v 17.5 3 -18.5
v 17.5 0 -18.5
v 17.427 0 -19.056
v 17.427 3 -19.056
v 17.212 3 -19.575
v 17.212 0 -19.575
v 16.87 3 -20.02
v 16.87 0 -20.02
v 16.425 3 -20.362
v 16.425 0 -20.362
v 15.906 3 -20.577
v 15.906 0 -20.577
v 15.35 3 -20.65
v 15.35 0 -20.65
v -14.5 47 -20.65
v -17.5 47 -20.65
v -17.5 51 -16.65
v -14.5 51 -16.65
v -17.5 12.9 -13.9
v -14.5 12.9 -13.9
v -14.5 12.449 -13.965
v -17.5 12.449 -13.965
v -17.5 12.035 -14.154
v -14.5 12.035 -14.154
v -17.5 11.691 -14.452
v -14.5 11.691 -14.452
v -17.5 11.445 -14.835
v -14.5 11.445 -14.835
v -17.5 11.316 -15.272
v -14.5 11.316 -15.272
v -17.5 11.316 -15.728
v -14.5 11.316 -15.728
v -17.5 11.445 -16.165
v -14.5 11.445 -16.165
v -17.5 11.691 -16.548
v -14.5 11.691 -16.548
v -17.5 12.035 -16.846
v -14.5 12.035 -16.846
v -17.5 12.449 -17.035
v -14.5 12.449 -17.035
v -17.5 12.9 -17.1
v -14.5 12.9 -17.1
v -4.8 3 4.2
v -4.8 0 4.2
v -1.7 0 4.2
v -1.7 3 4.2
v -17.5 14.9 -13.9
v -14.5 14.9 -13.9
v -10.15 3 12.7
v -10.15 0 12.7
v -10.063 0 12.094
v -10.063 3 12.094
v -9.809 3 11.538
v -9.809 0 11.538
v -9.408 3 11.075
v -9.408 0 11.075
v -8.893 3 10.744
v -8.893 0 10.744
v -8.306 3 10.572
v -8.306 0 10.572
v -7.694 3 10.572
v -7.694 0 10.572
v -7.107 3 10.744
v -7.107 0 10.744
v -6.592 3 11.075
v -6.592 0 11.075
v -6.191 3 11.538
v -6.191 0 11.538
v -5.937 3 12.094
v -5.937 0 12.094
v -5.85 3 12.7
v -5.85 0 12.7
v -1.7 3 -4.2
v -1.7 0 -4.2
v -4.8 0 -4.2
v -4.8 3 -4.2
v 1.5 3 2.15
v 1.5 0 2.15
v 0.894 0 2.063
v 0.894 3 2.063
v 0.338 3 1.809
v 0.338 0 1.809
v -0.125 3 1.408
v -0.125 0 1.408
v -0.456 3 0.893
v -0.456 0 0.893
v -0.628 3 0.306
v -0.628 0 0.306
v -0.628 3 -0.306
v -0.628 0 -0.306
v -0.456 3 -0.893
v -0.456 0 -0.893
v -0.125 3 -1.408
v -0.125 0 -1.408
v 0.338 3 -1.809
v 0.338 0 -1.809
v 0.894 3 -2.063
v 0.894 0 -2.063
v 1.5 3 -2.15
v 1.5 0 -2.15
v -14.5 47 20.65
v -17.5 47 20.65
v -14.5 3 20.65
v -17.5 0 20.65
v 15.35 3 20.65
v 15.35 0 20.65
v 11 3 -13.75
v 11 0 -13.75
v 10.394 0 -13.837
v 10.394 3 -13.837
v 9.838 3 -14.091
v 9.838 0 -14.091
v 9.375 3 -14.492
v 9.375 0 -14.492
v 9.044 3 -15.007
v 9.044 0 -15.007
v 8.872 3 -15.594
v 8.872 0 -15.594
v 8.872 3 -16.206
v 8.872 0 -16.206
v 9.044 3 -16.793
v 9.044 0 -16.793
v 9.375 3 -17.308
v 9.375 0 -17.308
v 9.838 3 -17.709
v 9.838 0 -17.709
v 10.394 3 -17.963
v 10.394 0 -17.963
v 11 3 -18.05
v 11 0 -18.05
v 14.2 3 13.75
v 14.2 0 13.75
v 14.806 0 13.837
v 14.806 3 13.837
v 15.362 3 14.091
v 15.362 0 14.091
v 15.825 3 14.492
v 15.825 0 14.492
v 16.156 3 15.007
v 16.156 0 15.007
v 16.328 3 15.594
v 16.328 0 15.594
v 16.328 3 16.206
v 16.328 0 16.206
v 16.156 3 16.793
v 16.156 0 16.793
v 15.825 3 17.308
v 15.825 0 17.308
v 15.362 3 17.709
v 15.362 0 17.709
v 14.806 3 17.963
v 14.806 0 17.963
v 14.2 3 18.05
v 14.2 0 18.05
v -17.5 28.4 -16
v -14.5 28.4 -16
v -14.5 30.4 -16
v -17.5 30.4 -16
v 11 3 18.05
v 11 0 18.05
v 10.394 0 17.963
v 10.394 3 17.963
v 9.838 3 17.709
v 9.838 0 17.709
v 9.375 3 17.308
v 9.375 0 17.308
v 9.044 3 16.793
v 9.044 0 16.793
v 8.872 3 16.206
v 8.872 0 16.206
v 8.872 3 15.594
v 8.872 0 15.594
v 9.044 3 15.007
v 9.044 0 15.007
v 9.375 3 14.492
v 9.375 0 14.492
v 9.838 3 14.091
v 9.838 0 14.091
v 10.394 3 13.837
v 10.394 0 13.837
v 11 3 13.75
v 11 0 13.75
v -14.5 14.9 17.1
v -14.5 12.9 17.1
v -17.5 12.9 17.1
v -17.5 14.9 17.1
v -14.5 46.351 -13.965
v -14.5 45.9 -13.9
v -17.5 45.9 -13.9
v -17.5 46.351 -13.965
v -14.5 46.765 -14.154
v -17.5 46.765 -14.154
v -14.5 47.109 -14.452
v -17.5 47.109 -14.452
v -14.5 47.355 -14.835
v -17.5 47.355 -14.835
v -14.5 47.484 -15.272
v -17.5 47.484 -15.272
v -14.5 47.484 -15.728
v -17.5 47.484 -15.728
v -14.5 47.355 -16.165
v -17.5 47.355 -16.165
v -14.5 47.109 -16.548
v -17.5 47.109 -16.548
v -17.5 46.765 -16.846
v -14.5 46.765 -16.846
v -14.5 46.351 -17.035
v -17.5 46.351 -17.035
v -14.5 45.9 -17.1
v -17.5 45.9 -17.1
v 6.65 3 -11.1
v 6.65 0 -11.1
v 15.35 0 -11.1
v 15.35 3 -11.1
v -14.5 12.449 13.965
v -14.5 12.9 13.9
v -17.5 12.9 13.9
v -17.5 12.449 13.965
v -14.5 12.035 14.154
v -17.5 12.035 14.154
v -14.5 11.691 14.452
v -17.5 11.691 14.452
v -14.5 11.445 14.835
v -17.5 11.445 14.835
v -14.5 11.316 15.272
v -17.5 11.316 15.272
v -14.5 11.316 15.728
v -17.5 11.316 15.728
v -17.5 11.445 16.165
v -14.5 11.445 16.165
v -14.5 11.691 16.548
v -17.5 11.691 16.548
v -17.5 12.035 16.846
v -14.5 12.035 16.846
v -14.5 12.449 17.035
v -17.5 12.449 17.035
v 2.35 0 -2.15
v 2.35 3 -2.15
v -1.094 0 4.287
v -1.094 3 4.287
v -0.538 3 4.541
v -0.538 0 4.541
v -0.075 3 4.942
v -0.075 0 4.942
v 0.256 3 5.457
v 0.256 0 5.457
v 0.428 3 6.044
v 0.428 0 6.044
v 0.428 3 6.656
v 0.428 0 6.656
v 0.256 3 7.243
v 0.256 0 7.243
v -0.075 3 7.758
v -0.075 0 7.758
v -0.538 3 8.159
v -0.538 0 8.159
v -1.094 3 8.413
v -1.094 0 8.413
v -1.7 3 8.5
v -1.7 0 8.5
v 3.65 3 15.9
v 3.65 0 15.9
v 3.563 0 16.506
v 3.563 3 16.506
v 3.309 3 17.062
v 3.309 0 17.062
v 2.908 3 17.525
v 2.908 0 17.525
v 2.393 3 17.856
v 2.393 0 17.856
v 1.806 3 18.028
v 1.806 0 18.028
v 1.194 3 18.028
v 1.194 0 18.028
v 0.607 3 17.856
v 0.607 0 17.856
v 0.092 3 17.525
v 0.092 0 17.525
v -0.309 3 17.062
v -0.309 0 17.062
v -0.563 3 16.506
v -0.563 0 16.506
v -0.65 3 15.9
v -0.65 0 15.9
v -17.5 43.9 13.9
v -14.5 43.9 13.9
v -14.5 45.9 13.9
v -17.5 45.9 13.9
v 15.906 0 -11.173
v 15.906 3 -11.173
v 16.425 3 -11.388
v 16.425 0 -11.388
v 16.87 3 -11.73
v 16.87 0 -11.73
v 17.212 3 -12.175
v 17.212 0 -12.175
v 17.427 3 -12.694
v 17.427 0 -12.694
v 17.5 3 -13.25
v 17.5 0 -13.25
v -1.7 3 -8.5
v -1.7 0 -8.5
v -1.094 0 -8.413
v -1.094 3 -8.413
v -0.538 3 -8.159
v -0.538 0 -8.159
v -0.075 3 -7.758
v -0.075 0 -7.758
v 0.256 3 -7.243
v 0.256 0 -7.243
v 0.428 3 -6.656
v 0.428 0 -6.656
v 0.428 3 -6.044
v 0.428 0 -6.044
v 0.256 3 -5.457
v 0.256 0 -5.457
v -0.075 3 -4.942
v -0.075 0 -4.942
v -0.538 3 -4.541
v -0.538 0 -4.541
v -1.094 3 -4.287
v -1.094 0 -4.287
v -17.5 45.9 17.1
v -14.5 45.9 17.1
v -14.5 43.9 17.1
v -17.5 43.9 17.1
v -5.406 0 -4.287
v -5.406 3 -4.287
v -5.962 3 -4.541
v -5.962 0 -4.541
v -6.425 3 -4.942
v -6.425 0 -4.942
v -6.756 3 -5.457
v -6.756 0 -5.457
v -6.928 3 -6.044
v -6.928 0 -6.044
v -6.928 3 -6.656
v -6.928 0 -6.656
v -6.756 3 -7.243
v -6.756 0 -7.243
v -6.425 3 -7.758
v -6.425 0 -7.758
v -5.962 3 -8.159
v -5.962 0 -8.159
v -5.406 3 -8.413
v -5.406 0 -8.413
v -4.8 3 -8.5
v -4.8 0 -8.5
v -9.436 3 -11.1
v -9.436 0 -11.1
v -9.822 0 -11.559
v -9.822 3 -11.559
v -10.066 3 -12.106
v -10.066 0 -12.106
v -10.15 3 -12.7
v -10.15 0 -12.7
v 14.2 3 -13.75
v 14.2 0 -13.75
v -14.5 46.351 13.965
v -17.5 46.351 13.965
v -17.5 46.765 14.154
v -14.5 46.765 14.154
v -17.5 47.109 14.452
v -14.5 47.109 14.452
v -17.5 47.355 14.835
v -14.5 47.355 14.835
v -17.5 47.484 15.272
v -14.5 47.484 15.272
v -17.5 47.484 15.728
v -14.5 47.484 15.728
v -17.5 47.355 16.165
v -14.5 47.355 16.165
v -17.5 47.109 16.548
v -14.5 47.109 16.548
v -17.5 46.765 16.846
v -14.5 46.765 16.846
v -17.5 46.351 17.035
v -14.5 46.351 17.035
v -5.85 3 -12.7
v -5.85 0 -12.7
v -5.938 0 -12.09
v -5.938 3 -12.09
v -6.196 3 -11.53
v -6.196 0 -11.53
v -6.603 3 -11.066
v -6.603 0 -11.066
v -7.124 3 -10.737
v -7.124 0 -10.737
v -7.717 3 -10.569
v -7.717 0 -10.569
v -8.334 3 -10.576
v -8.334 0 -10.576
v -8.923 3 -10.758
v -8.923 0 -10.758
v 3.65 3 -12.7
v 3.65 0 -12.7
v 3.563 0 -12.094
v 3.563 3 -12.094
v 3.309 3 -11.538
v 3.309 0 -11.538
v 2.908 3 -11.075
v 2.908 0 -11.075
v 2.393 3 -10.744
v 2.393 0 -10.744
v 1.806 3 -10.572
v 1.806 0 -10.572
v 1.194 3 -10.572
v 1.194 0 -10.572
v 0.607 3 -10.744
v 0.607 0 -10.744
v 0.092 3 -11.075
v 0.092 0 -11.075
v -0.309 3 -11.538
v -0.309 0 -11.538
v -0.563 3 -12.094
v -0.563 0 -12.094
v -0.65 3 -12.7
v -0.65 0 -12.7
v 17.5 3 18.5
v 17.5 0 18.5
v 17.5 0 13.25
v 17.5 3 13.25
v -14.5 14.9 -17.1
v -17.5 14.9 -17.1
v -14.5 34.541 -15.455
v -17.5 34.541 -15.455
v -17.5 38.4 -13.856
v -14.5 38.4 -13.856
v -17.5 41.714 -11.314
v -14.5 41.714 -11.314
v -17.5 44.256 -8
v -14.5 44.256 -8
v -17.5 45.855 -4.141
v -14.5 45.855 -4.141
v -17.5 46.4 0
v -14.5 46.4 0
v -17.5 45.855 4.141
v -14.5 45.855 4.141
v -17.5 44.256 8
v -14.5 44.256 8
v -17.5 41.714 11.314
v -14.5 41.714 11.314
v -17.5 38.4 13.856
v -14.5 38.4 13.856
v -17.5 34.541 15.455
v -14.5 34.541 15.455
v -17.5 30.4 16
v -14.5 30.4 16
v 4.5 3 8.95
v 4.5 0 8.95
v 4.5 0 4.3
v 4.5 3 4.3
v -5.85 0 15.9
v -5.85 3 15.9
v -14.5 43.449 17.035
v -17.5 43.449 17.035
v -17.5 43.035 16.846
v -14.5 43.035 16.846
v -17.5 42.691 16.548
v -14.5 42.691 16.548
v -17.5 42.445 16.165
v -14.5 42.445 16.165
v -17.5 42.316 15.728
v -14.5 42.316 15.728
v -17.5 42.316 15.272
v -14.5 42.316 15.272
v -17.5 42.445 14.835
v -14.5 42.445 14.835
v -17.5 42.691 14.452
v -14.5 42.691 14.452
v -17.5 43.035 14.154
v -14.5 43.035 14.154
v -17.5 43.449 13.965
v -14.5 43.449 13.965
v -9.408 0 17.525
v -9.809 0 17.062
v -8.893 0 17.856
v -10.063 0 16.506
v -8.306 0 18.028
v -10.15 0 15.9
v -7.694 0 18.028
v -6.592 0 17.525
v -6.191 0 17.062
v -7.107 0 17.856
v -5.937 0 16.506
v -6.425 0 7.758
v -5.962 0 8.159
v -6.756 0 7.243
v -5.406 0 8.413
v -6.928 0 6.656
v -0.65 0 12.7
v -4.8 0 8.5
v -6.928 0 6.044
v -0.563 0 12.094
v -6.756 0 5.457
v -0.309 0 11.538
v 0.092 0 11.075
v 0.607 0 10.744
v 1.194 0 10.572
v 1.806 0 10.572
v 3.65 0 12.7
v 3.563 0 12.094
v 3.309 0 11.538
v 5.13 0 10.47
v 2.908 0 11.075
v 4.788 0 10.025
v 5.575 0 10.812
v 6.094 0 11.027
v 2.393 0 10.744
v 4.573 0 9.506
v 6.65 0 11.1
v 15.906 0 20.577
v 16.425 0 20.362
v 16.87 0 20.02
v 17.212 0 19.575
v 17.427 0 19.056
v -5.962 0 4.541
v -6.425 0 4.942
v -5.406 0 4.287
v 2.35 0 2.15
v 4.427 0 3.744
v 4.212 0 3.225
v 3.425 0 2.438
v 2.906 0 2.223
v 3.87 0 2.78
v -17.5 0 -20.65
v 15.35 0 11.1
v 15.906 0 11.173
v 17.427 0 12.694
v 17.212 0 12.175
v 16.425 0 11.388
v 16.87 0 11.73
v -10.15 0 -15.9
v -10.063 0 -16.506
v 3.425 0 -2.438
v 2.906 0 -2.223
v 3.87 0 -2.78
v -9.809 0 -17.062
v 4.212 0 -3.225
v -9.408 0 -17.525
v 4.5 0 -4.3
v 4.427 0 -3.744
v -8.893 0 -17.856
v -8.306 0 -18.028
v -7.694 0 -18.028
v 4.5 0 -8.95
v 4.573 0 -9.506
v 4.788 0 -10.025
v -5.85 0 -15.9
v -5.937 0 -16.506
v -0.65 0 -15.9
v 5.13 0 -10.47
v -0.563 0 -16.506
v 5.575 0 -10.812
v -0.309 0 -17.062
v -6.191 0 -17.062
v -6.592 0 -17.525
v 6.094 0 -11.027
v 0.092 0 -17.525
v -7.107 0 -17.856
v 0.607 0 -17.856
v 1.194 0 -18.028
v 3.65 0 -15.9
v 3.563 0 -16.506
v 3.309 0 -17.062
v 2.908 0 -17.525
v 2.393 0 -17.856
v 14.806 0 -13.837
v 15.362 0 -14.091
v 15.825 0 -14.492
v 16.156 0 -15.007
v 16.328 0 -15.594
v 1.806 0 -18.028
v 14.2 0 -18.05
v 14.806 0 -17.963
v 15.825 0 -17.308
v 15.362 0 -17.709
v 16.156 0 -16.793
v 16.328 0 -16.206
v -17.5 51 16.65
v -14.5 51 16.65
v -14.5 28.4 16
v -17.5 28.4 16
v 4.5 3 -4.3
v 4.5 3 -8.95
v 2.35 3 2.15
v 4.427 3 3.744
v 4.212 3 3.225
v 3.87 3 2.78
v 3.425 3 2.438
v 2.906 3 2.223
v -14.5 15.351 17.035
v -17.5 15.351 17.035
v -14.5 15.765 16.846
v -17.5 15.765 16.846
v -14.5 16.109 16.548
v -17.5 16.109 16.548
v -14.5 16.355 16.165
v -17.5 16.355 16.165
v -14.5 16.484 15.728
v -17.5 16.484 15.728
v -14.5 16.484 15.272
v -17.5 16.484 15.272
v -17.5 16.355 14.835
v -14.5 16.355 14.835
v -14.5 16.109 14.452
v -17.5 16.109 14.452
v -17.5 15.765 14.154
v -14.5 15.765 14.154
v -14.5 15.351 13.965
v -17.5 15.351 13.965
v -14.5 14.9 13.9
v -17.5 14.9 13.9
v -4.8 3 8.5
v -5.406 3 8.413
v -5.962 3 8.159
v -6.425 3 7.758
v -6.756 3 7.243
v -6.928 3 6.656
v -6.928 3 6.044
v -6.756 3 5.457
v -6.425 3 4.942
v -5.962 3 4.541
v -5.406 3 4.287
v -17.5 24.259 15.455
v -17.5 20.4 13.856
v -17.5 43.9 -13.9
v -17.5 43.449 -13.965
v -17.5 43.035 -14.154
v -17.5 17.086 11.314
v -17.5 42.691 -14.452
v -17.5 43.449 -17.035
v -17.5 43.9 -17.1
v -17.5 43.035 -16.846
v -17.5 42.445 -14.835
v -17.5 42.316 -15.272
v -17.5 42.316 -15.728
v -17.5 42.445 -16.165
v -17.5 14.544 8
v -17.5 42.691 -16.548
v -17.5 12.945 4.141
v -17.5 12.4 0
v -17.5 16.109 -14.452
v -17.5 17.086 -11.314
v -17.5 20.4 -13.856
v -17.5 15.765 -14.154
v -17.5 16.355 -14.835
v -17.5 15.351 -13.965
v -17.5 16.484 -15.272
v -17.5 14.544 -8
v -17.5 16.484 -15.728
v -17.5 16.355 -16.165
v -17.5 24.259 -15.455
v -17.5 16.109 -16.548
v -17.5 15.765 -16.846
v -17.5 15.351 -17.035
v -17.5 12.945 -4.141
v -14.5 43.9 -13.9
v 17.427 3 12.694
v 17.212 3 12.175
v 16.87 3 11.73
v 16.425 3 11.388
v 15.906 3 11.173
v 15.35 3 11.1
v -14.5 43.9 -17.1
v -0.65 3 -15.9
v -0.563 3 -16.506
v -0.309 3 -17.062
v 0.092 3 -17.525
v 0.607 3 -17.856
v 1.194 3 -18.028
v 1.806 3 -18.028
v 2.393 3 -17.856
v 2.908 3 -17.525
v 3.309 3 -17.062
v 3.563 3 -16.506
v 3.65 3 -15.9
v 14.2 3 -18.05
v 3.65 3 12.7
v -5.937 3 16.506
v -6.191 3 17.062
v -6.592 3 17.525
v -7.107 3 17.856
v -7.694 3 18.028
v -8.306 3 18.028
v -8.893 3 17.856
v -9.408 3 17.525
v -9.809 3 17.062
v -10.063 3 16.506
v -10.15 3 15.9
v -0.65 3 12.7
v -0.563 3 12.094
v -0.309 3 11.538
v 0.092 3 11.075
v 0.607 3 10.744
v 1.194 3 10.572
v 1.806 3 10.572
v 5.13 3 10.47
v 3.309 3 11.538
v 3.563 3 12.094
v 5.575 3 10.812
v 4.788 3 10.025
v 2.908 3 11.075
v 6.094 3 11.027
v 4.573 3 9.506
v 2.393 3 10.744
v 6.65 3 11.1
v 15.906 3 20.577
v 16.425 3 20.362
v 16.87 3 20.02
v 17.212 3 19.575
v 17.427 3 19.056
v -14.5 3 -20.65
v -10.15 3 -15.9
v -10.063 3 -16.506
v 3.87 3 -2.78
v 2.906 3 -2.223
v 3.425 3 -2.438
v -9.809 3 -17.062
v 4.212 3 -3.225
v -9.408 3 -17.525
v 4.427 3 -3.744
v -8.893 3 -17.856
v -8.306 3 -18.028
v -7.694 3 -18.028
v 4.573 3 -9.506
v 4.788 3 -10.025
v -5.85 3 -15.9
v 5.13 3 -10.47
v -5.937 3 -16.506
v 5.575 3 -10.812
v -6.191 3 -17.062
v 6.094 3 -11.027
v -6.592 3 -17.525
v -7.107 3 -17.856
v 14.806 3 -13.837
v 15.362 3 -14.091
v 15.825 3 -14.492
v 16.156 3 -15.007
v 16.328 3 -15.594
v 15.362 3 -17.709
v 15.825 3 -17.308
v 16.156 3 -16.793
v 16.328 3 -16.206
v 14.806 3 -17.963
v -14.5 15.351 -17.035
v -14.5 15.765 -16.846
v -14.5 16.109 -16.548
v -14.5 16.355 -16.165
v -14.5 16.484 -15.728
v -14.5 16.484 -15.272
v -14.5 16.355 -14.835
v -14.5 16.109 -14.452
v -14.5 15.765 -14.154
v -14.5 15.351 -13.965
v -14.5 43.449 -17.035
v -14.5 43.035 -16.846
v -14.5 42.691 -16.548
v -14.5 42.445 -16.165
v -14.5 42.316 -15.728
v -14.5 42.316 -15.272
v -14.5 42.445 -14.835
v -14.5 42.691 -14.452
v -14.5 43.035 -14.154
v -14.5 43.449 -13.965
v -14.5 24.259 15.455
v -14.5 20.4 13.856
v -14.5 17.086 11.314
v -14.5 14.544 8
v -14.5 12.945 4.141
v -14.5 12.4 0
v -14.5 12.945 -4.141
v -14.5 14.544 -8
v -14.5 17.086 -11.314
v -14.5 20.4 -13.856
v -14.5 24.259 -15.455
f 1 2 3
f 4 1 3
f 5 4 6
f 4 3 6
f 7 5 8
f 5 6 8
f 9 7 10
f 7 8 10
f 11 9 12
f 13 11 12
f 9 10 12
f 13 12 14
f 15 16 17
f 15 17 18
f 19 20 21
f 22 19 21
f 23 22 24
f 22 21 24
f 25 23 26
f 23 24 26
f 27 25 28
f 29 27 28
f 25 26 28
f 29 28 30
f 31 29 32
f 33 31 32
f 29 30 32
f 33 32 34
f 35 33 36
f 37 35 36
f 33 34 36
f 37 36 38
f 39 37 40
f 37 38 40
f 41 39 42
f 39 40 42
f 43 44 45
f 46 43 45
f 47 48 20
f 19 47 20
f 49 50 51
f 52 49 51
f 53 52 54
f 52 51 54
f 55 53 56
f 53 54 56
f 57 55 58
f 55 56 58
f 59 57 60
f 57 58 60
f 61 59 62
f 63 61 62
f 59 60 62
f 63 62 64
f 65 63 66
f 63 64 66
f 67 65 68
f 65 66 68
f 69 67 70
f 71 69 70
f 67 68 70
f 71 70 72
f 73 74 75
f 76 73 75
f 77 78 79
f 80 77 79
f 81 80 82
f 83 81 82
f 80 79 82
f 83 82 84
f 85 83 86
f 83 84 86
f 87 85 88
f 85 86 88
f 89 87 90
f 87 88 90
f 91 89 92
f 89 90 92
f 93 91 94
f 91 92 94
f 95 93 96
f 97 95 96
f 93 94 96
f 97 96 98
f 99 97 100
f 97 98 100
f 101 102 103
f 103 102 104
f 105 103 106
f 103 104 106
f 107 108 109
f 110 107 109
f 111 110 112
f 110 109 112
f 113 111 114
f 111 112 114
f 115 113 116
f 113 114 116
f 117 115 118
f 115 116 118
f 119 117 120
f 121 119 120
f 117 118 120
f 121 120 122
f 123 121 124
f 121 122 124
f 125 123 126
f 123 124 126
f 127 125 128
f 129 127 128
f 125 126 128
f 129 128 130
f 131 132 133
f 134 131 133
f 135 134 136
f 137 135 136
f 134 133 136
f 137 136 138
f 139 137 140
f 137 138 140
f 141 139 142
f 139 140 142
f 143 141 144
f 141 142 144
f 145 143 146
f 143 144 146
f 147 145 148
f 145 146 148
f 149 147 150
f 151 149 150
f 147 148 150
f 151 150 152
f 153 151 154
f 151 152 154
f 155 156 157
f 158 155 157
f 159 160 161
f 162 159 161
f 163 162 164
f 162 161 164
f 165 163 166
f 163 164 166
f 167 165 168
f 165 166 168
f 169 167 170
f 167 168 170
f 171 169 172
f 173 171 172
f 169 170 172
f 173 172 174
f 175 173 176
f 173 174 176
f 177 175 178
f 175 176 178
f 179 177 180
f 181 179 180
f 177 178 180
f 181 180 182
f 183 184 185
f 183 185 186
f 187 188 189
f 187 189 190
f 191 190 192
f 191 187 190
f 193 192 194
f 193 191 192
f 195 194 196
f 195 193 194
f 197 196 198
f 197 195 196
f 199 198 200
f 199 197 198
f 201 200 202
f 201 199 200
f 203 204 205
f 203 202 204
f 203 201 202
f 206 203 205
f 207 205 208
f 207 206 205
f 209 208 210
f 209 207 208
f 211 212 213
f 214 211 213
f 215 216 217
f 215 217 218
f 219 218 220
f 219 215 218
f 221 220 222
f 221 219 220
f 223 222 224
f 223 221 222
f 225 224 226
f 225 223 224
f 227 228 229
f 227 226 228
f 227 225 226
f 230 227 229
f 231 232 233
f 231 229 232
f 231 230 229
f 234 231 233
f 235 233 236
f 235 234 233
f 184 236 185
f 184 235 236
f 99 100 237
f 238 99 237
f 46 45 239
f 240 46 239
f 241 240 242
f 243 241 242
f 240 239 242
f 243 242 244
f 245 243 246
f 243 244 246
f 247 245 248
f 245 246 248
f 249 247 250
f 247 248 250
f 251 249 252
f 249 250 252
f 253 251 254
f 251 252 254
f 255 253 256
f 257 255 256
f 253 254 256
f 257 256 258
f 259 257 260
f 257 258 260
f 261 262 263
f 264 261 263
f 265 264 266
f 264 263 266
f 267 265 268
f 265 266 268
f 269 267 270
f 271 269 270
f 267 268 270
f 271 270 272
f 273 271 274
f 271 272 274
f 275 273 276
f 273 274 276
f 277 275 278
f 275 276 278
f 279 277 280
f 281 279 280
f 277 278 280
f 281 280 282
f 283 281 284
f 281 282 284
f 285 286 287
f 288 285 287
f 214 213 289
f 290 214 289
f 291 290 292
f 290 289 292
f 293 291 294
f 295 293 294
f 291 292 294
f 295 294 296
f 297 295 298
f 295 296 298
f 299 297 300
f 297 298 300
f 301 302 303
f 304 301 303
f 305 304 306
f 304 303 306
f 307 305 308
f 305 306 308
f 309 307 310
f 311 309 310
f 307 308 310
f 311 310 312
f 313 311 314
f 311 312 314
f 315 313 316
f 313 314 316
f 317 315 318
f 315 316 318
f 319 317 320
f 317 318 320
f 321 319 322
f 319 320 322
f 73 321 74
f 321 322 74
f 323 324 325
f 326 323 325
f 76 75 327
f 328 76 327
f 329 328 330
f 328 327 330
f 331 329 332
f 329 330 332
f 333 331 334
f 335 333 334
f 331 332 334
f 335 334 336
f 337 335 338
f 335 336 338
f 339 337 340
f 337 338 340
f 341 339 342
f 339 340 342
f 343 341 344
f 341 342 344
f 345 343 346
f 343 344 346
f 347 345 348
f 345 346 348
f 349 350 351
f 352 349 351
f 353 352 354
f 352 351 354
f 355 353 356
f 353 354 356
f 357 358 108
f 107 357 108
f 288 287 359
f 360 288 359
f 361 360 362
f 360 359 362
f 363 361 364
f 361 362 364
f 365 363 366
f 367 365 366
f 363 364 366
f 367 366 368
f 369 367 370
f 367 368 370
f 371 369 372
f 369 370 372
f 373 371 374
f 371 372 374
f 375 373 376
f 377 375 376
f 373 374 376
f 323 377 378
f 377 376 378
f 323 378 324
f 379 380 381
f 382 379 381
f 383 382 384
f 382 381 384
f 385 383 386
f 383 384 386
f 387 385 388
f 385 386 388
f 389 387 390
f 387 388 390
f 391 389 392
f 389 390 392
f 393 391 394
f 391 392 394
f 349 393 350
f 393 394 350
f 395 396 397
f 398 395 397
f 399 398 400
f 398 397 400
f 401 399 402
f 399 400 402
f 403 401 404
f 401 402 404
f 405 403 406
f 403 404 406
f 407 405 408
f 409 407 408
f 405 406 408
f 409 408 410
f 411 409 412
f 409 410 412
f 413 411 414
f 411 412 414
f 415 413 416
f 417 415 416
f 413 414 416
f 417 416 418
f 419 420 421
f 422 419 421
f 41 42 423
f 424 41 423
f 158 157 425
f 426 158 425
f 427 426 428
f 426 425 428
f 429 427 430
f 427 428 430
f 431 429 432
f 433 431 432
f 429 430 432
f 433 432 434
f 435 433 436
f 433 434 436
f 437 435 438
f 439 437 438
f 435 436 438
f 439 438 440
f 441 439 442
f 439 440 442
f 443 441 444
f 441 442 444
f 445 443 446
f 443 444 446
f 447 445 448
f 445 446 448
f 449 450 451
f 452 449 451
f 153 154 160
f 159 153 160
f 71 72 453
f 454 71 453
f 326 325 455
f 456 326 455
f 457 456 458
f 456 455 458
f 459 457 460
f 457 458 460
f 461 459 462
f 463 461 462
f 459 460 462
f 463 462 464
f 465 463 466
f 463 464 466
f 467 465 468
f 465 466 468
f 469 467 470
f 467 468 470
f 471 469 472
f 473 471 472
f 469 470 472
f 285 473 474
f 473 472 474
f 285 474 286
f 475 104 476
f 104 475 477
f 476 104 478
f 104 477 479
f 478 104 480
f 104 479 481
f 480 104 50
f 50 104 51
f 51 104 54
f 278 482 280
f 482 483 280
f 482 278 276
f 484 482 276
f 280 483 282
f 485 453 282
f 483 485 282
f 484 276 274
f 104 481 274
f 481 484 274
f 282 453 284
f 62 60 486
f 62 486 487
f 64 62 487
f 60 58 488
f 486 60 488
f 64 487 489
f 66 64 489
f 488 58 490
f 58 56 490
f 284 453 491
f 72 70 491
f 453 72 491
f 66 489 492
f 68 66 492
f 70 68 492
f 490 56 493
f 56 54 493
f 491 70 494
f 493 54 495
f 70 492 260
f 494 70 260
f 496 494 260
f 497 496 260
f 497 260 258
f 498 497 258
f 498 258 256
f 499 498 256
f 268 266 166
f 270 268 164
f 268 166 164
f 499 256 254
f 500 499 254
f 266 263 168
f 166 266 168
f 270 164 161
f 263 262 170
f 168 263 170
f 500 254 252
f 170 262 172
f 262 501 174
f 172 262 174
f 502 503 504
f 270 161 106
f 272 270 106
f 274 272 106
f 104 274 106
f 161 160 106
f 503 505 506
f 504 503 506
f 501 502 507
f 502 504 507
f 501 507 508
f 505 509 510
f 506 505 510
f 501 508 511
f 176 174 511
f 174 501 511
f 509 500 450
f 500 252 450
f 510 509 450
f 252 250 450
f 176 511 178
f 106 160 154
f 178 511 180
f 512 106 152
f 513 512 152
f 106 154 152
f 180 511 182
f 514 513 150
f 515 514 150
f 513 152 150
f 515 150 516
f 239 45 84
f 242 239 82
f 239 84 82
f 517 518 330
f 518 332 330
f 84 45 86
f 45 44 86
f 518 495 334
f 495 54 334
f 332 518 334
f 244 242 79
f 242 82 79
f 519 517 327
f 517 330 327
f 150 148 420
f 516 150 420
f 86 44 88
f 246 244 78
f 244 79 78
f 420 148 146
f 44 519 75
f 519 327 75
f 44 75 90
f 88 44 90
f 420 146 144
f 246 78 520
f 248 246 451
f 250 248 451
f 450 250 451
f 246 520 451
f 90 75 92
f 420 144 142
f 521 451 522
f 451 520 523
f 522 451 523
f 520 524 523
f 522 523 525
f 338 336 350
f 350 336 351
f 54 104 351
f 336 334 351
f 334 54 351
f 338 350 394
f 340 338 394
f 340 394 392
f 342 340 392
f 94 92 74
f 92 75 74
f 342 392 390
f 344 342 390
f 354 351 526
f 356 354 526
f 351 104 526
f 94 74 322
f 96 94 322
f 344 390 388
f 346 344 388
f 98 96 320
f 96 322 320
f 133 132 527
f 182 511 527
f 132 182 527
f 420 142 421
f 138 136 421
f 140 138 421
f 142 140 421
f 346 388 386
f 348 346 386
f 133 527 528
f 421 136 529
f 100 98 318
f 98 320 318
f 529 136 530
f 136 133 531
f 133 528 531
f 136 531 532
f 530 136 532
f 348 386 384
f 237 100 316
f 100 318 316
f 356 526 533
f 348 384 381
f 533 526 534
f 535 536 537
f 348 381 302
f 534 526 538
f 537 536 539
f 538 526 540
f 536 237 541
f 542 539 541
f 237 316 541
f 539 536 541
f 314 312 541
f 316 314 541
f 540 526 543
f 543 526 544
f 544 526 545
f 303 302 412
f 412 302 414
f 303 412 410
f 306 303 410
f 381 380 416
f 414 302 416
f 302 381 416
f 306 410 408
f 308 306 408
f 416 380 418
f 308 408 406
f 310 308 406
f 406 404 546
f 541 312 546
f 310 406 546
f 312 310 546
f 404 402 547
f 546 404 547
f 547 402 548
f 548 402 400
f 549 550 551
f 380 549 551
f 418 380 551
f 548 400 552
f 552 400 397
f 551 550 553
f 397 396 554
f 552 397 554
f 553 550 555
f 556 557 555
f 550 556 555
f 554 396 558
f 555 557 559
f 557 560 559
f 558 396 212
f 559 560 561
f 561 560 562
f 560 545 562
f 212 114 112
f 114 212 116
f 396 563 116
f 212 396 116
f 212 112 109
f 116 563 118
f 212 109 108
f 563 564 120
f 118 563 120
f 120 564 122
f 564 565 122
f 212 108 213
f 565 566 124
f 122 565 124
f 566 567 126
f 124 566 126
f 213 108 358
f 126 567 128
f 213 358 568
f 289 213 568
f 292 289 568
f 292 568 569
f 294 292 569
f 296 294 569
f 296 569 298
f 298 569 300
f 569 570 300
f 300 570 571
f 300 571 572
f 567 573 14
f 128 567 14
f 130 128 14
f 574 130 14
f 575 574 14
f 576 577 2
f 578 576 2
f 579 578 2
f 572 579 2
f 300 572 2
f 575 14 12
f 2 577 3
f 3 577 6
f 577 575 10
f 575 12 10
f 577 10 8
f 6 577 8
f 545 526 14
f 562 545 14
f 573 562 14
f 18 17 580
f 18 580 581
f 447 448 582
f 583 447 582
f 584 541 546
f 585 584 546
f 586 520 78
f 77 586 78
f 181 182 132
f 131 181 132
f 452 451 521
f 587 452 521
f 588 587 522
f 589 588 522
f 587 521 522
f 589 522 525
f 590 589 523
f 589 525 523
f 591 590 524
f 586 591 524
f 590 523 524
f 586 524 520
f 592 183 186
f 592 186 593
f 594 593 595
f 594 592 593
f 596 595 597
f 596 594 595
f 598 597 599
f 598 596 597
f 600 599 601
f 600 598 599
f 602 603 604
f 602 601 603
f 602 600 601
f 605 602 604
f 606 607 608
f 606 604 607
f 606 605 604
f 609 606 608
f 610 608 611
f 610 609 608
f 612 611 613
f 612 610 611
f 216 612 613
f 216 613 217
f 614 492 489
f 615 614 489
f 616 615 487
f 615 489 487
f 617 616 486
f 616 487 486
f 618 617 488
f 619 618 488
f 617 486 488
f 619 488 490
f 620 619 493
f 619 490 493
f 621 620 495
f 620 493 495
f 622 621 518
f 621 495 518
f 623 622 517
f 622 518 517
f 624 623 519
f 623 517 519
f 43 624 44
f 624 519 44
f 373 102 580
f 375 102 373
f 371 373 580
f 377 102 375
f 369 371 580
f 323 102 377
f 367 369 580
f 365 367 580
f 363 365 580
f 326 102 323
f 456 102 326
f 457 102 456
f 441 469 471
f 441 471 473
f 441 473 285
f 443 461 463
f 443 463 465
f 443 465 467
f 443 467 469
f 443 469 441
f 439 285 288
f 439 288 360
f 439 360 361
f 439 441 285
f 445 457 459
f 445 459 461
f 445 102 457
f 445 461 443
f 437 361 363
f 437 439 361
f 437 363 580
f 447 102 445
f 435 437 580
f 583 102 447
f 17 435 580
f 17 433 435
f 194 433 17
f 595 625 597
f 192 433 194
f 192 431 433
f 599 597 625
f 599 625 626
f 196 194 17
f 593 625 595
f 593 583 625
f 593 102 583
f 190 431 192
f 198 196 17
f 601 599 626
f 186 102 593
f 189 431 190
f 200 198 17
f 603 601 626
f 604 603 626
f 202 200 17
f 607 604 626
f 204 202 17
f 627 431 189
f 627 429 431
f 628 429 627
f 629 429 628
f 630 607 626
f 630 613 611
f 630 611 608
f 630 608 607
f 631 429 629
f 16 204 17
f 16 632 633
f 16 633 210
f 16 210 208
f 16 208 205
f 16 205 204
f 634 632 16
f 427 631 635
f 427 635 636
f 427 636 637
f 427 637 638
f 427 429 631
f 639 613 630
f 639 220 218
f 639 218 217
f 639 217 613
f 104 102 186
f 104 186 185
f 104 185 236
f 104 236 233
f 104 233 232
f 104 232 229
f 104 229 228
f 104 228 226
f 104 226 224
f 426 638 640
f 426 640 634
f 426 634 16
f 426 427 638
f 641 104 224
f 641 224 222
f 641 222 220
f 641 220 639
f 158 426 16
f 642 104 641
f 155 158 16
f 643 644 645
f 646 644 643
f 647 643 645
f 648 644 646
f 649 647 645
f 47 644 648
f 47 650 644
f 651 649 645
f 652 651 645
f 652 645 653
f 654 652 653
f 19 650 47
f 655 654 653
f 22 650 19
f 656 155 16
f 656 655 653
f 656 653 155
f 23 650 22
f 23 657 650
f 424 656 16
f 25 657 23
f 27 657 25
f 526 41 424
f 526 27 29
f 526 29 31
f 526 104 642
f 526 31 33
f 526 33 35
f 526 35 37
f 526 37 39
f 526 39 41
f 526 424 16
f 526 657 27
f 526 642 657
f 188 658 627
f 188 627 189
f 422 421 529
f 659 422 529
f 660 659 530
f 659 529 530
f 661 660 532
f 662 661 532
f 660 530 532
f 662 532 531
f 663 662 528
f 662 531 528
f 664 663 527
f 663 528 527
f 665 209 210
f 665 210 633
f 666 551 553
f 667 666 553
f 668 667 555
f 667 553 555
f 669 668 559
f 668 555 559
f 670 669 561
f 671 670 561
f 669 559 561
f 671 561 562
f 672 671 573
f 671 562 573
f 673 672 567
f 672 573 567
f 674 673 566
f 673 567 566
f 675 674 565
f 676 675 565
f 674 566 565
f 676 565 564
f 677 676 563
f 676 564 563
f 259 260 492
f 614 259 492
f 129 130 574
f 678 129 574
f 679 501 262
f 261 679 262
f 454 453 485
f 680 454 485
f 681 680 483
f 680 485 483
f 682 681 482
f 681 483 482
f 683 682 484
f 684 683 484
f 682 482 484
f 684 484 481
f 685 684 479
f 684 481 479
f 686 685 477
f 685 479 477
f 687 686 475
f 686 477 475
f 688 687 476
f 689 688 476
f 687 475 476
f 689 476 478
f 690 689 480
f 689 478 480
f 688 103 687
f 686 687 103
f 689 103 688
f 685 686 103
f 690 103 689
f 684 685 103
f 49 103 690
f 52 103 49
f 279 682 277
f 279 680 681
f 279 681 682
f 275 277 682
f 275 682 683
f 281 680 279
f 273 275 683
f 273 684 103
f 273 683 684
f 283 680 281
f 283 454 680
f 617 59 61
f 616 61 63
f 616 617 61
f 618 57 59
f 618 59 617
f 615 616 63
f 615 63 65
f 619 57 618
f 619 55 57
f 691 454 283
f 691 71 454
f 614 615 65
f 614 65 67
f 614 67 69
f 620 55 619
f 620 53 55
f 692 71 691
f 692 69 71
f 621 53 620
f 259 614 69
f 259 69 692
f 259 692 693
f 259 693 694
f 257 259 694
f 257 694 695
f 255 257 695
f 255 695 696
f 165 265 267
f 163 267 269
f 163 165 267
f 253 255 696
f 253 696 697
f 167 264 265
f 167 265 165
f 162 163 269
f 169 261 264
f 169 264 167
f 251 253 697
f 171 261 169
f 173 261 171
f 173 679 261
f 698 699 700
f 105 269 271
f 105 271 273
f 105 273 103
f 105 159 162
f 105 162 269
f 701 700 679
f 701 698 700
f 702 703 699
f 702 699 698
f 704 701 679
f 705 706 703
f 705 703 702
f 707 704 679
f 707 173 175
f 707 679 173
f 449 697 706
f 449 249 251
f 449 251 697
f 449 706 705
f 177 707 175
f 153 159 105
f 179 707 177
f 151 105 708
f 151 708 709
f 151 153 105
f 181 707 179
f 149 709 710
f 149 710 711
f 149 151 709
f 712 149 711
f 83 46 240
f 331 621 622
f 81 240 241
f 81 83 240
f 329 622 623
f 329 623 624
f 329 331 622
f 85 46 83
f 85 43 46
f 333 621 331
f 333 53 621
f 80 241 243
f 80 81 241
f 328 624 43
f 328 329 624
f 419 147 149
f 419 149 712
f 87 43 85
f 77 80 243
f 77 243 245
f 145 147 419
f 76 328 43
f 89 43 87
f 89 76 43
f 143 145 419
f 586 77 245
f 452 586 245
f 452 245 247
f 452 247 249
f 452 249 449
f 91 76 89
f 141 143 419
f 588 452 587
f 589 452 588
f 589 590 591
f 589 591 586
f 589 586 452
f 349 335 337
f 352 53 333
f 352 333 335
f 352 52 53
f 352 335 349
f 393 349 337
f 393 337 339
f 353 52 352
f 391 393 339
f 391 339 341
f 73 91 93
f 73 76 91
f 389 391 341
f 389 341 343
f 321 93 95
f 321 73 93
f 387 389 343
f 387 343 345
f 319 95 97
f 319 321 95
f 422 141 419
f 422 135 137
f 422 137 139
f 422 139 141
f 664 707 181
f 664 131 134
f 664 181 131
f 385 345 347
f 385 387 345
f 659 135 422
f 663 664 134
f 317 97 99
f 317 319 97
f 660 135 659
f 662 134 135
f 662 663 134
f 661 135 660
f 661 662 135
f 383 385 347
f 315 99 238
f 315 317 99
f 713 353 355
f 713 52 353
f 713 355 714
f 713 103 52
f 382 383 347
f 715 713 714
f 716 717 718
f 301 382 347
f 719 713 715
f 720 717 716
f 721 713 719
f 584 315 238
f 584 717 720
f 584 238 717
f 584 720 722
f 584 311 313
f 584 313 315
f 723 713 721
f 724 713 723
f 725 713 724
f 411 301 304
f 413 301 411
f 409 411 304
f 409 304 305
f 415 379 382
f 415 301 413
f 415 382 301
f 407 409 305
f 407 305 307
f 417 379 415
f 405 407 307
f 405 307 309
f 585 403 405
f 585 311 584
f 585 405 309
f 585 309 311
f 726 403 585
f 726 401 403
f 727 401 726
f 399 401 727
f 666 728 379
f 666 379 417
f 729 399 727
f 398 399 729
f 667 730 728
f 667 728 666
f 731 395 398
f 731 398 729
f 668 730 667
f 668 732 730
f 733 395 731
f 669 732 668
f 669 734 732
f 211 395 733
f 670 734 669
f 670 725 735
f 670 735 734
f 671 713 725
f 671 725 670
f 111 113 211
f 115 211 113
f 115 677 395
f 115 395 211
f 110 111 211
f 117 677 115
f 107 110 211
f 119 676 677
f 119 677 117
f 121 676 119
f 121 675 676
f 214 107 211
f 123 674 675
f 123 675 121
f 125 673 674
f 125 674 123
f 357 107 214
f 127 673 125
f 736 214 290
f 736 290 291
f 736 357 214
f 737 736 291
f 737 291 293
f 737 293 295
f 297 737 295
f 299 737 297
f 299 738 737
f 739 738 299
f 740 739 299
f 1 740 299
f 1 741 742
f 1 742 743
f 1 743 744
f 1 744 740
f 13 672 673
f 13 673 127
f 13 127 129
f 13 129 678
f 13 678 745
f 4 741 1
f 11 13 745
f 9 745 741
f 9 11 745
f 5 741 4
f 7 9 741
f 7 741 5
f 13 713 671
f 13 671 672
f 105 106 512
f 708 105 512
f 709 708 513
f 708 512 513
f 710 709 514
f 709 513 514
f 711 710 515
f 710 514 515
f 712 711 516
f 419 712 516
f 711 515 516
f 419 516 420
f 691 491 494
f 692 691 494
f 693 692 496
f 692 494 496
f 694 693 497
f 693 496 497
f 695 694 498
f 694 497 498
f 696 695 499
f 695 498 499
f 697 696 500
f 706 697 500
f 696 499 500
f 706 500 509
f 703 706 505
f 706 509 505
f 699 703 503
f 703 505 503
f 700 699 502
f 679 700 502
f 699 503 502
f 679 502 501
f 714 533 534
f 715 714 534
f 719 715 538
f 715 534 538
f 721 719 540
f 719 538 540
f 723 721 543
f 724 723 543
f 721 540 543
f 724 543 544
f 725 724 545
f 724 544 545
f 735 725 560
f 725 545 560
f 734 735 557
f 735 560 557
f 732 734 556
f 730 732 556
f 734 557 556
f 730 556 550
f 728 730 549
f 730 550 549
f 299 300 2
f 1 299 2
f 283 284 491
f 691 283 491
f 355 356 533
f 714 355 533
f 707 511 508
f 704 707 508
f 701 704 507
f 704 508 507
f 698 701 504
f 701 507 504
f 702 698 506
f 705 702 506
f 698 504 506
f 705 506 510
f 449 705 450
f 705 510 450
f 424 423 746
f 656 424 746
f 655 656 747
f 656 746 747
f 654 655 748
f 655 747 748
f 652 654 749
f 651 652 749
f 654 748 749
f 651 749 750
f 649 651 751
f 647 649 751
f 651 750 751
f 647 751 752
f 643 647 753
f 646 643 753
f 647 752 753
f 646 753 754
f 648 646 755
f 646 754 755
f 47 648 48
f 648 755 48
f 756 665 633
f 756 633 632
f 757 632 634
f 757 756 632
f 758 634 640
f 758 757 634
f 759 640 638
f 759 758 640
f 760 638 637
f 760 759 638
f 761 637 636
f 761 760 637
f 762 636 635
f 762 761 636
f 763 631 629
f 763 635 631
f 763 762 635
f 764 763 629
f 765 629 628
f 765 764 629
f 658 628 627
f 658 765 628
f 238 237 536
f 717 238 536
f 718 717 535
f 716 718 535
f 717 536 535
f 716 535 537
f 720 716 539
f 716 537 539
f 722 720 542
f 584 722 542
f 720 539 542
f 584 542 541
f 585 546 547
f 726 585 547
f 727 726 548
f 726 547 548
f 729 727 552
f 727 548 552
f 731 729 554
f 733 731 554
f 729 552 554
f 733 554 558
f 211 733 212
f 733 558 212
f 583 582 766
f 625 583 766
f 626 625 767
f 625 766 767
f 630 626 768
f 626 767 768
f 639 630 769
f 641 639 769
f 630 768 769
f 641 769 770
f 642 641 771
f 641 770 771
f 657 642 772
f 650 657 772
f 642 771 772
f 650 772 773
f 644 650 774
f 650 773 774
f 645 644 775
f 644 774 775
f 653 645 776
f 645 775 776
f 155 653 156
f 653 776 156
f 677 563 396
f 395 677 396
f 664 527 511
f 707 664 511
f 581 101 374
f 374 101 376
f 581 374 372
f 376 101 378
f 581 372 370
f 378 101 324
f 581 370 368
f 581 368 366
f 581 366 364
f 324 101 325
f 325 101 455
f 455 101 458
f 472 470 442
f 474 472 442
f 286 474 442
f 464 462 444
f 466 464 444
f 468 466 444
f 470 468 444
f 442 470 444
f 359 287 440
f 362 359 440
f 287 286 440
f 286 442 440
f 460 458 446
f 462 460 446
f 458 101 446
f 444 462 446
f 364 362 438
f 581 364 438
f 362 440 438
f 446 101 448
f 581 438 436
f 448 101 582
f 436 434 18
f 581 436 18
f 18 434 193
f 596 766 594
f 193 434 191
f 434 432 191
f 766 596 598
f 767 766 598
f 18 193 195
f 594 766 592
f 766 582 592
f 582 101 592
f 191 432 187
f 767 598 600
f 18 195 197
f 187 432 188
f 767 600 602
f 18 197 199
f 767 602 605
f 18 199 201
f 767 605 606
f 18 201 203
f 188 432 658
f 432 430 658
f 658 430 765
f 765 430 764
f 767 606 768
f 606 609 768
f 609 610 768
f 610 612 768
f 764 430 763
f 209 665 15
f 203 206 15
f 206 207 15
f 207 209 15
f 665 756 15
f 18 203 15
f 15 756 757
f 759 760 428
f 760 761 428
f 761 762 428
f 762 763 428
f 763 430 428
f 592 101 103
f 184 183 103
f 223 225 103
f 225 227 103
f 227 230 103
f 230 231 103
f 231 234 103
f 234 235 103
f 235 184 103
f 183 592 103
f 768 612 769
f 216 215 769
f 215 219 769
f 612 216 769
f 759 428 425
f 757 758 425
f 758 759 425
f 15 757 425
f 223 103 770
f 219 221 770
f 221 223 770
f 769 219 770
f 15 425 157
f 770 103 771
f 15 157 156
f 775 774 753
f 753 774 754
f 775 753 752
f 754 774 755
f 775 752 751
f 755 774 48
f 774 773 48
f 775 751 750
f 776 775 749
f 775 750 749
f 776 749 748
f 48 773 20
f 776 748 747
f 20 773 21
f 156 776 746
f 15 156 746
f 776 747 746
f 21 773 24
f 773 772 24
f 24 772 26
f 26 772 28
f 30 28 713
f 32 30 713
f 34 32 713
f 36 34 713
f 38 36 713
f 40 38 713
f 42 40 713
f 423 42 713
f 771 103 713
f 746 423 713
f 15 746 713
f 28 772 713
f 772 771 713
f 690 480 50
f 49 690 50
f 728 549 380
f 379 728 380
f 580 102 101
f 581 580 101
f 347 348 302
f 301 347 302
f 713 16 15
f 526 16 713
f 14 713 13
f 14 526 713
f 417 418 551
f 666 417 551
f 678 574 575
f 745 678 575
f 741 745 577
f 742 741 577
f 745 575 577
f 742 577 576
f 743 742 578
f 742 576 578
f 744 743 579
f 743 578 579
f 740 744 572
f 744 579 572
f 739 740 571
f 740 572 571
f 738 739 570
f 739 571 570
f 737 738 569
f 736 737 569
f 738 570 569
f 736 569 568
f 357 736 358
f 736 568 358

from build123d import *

# Parameters (mm, degrees)
BOSS_EXTRUDE1_DEPTH = 3
SKETCH2_W           = 3
SKETCH2_H           = 41.3
BOSS_EXTRUDE2_DEPTH = 48
CUT_EXTRUDE1_DEPTH  = 48
CHAMFER1_SIZE       = 4


with BuildPart() as part:
    # Sketch1 → Boss-Extrude1 (new body)
    with BuildSketch(Plane(origin=(0, 0, 0), x_dir=(1, 0, 0), z_dir=(0, 1, 0))):
        with BuildLine():
            Line((15.35, 20.65), (-17.5, 20.65))
            Line((-17.5, 20.65), (-17.5, -20.65))
            Line((-17.5, -20.65), (15.35, -20.65))
            ThreePointArc((15.35, -20.65), (16.87027958, -20.02027958), (17.5, -18.5))
            Line((17.5, -18.5), (17.5, -13.25))
            ThreePointArc((17.5, -13.25), (16.87027958, -11.72972042), (15.35, -11.1))
            Line((15.35, -11.1), (6.65, -11.1))
            ThreePointArc((6.65, -11.1), (5.12972042, -10.47027958), (4.5, -8.95))
            Line((4.5, -8.95), (4.5, -4.3))
            ThreePointArc((4.5, -4.3), (3.87027958, -2.77972042), (2.35, -2.15))
            Line((2.35, -2.15), (1.5, -2.15))
            ThreePointArc((1.5, -2.15), (-0.65, 0), (1.5, 2.15))
            Line((1.5, 2.15), (2.35, 2.15))
            ThreePointArc((2.35, 2.15), (3.87027958, 2.77972042), (4.5, 4.3))
            Line((4.5, 4.3), (4.5, 8.95))
            ThreePointArc((4.5, 8.95), (5.12972042, 10.47027958), (6.65, 11.1))
            Line((6.65, 11.1), (15.35, 11.1))
            ThreePointArc((15.35, 11.1), (16.87027958, 11.72972042), (17.5, 13.25))
            Line((17.5, 13.25), (17.5, 18.5))
            ThreePointArc((17.5, 18.5), (16.87027958, 20.02027958), (15.35, 20.65))
        make_face()
        with BuildLine():
            Line((-5.85, -12.7), (-5.85, -15.9))
            ThreePointArc((-5.85, -15.9), (-8, -18.05), (-10.15, -15.9))
            Line((-10.15, -15.9), (-10.15, -12.7))
            ThreePointArc((-10.15, -12.7), (-8, -10.55), (-5.85, -12.7))
        make_face(mode=Mode.SUBTRACT)
        with BuildLine():
            Line((-1.7, -8.5), (-4.8, -8.5))
            ThreePointArc((-4.8, -8.5), (-6.95, -6.35), (-4.8, -4.2))
            Line((-4.8, -4.2), (-1.7, -4.2))
            ThreePointArc((-1.7, -4.2), (0.45, -6.35), (-1.7, -8.5))
        make_face(mode=Mode.SUBTRACT)
        with BuildLine():
            Line((3.65, -12.7), (3.65, -15.9))
            ThreePointArc((3.65, -15.9), (1.5, -18.05), (-0.65, -15.9))
            Line((-0.65, -15.9), (-0.65, -12.7))
            ThreePointArc((-0.65, -12.7), (1.5, -10.55), (3.65, -12.7))
        make_face(mode=Mode.SUBTRACT)
        with BuildLine():
            Line((14.2, -18.05), (11, -18.05))
            ThreePointArc((11, -18.05), (8.85, -15.9), (11, -13.75))
            Line((11, -13.75), (14.2, -13.75))
            ThreePointArc((14.2, -13.75), (16.35, -15.9), (14.2, -18.05))
        make_face(mode=Mode.SUBTRACT)
        with BuildLine():
            ThreePointArc((-4.8, 4.2), (-6.95, 6.35), (-4.8, 8.5))
            Line((-4.8, 8.5), (-1.7, 8.5))
            ThreePointArc((-1.7, 8.5), (0.45, 6.35), (-1.7, 4.2))
            Line((-1.7, 4.2), (-4.8, 4.2))
        make_face(mode=Mode.SUBTRACT)
        with BuildLine():
            ThreePointArc((-10.15, 15.9), (-8, 18.05), (-5.85, 15.9))
            Line((-5.85, 15.9), (-5.85, 12.7))
            ThreePointArc((-5.85, 12.7), (-7.123986993, 10.736558834), (-9.436140662, 11.1))
            ThreePointArc((-9.436140662, 11.1), (-9.963441166, 11.823986993), (-10.15, 12.7))
            Line((-10.15, 12.7), (-10.15, 15.9))
        make_face(mode=Mode.SUBTRACT)
        with BuildLine():
            ThreePointArc((-0.65, 15.9), (1.5, 18.05), (3.65, 15.9))
            Line((3.65, 15.9), (3.65, 12.7))
            ThreePointArc((3.65, 12.7), (1.5, 10.55), (-0.65, 12.7))
            Line((-0.65, 12.7), (-0.65, 15.9))
        make_face(mode=Mode.SUBTRACT)
        with BuildLine():
            ThreePointArc((11, 13.75), (8.85, 15.9), (11, 18.05))
            Line((11, 18.05), (14.2, 18.05))
            ThreePointArc((14.2, 18.05), (16.35, 15.9), (14.2, 13.75))
            Line((14.2, 13.75), (11, 13.75))
        make_face(mode=Mode.SUBTRACT)
    extrude(amount=BOSS_EXTRUDE1_DEPTH)

    # Sketch2 → Boss-Extrude2 (add)
    with BuildSketch(Plane(origin=(0, 3, 0), x_dir=(1, 0, 0), z_dir=(0, 1, 0))):
        with Locations((-16, 0)):
            Rectangle(SKETCH2_W, SKETCH2_H)
    extrude(amount=BOSS_EXTRUDE2_DEPTH)

    # Sketch3 → Cut-Extrude1 (cut)
    with BuildSketch(Plane(origin=(-14.5, 0, 0), x_dir=(0, 0, -1), z_dir=(1, 0, 0))):
        with BuildLine():
            Line((-16, 30.4), (-16, 28.4))
            ThreePointArc((-16, 28.4), (0, 12.4), (16, 28.4))
            Line((16, 28.4), (16, 30.4))
            ThreePointArc((16, 30.4), (0, 46.4), (-16, 30.4))
        make_face()
        with BuildLine():
            Line((17.1, 45.9), (17.1, 43.9))
            ThreePointArc((17.1, 43.9), (15.5, 42.3), (13.9, 43.9))
            Line((13.9, 43.9), (13.9, 45.9))
            ThreePointArc((13.9, 45.9), (15.5, 47.5), (17.1, 45.9))
        make_face()
        with BuildLine():
            Line((-17.1, 45.9), (-17.1, 43.9))
            ThreePointArc((-17.1, 43.9), (-15.5, 42.3), (-13.9, 43.9))
            Line((-13.9, 43.9), (-13.9, 45.9))
            ThreePointArc((-13.9, 45.9), (-15.5, 47.5), (-17.1, 45.9))
        make_face()
        with BuildLine():
            Line((17.1, 12.9), (17.1, 14.9))
            ThreePointArc((17.1, 14.9), (15.5, 16.5), (13.9, 14.9))
            Line((13.9, 14.9), (13.9, 12.9))
            ThreePointArc((13.9, 12.9), (15.5, 11.3), (17.1, 12.9))
        make_face()
        with BuildLine():
            Line((-17.1, 12.9), (-17.1, 14.9))
            ThreePointArc((-17.1, 14.9), (-15.5, 16.5), (-13.9, 14.9))
            Line((-13.9, 14.9), (-13.9, 12.9))
            ThreePointArc((-13.9, 12.9), (-15.5, 11.3), (-17.1, 12.9))
        make_face()
    extrude(amount=-CUT_EXTRUDE1_DEPTH, mode=Mode.SUBTRACT)

    # Chamfer1
    chamfer1_edges = [part.edges().sort_by_distance(p)[0] for p in [
        (-16, 51, 20.65),
        (-16, 51, -20.65),
    ]]
    chamfer(chamfer1_edges, length=CHAMFER1_SIZE)


solid = part.part
